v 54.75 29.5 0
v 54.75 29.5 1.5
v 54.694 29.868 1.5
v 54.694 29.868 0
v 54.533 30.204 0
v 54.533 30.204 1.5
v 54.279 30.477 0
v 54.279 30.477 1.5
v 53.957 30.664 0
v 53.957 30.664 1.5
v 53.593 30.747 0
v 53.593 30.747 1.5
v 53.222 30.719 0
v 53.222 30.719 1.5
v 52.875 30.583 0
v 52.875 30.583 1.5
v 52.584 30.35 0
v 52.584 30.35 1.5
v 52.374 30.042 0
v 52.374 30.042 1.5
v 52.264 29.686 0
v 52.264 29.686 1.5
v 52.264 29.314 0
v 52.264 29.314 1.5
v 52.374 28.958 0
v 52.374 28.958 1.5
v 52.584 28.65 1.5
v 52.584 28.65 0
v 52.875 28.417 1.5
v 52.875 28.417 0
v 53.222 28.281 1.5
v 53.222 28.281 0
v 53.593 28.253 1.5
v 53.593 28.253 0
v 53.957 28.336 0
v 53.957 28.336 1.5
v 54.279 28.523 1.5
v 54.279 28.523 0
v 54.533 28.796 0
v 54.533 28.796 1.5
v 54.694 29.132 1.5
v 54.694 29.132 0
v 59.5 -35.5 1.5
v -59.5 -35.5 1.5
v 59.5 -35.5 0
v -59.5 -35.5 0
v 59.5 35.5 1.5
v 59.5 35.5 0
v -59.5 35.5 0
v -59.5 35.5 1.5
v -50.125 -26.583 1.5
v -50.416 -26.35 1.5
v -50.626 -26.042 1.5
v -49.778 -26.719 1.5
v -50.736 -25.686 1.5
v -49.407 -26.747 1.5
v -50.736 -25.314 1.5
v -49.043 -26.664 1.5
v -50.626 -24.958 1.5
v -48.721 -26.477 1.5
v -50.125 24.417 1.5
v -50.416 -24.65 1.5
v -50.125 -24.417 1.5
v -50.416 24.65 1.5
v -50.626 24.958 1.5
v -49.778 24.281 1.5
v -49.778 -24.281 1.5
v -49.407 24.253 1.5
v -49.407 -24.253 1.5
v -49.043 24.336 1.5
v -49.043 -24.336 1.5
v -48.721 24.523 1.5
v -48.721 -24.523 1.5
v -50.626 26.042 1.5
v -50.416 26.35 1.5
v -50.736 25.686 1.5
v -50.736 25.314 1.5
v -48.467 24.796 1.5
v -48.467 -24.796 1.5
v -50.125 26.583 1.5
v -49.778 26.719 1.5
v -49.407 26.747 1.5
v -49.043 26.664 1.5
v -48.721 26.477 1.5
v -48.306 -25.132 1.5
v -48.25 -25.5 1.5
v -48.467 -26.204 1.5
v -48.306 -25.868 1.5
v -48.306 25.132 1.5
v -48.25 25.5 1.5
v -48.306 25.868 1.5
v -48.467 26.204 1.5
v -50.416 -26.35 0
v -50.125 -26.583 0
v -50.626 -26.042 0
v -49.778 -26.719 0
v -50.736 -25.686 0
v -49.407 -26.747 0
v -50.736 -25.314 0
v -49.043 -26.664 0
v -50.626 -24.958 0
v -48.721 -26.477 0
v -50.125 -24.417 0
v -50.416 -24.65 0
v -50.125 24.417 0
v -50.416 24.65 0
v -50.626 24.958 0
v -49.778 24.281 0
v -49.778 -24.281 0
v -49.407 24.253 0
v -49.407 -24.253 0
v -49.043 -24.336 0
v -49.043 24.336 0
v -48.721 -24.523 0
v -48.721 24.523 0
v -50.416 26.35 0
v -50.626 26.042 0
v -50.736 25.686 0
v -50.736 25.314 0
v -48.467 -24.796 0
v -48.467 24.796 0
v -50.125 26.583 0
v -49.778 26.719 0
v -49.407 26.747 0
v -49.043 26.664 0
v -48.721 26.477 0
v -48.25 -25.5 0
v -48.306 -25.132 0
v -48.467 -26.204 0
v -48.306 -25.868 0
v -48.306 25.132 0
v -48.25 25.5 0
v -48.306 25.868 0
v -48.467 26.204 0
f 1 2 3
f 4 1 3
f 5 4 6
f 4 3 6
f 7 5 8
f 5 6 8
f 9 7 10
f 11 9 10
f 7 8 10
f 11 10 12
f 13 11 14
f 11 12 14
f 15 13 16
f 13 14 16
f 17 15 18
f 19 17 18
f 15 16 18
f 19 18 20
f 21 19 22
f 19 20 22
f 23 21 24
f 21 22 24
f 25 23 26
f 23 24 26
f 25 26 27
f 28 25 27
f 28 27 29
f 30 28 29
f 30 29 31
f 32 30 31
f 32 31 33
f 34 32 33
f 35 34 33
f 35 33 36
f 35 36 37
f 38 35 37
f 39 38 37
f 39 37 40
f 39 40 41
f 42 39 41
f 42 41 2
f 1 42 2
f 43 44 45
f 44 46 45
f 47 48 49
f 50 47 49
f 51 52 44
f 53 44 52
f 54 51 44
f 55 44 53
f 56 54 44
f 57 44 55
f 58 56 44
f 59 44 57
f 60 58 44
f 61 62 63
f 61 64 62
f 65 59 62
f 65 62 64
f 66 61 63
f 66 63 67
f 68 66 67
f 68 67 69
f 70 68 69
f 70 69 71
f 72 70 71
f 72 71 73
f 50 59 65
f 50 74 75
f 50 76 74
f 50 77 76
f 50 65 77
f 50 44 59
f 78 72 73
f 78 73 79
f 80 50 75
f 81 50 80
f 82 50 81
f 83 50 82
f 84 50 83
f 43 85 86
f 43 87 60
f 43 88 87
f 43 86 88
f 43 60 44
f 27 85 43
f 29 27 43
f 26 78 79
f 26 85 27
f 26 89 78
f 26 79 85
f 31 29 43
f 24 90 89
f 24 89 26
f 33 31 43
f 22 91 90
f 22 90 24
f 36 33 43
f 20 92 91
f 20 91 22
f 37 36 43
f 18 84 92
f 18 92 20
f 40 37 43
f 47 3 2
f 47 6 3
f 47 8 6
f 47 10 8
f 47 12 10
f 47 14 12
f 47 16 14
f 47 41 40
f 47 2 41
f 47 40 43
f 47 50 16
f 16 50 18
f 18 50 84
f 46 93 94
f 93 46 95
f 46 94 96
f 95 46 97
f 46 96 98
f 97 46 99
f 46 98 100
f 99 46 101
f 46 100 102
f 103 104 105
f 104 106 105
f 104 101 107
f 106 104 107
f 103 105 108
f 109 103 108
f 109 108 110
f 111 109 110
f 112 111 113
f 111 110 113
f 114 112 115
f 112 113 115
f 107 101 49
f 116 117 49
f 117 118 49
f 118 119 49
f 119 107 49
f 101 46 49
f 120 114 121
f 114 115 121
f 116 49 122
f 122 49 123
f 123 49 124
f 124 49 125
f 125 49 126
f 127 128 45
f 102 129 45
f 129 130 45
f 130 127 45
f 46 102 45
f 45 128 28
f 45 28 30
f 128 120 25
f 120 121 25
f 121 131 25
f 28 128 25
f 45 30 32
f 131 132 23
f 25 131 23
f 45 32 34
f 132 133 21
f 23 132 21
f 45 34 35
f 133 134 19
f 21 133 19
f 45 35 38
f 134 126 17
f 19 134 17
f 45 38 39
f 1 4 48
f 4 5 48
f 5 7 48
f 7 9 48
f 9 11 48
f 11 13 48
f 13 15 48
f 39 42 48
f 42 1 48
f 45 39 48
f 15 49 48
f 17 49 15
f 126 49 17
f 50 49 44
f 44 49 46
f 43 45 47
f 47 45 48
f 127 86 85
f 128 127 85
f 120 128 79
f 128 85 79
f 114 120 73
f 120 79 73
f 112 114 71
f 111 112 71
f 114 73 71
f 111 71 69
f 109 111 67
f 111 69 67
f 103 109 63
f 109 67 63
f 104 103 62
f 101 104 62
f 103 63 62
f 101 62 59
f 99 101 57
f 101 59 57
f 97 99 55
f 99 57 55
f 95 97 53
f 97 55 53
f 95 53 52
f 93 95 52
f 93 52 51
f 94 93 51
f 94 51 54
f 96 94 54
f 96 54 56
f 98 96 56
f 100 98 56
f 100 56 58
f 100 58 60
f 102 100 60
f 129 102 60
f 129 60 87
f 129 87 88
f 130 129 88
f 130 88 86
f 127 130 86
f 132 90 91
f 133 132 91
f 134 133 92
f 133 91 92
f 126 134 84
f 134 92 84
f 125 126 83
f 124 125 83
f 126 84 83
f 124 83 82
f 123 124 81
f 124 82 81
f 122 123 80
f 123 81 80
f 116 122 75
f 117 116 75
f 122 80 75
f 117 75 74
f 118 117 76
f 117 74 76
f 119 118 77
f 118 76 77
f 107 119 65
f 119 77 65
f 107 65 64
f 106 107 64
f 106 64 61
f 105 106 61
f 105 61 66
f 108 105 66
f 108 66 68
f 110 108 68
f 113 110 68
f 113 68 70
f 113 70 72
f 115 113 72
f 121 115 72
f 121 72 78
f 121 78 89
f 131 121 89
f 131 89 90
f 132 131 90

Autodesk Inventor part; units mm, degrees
ref_plane "YZ Plane" through (0, 0, 0) normal (1, 0, 0) x (0, 1, 0)
ref_plane "XZ Plane" through (0, 0, 0) normal (0, 1, 0) x (-1, 0, 0)
ref_plane "XY Plane" through (0, 0, 0) normal (0, 0, 1) x (1, 0, 0)
sketch "Schizzo1" plane through (0, 0, 0) normal (0, 0, 1) x (1, 0, 0)
  line L0 (-59.5, -35.5) -> (59.5, -35.5)
  line L1 (59.5, -35.5) -> (59.5, 35.5)
  line L2 (59.5, 35.5) -> (-59.5, 35.5)
  line L3 (-59.5, 35.5) -> (-59.5, -35.5)
  line L4 (-59.5, -35.5) -> (59.5, 35.5) construction
  line L5 (59.5, -35.5) -> (-59.5, 35.5) construction
  point P0 (0, 0)
  dimension "d0" = 119
  dimension "d1" = 71
extrude "Estrusione1" add sketch "Schizzo1" along normal blind 1.5
sketch "Schizzo4" plane through (0, 0, 1.5) normal (0, 0, 1) x (1, 0, 0)
  line L0 (59.5, 35.5) -> (-59.5, 35.5) projected
  line L1 (59.5, -35.5) -> (59.5, 35.5) projected
  line L2 (-59.5, -35.5) -> (59.5, -35.5) projected
  circle A0 centre (-49.5, 25.5) radius 1.25
  circle A1 centre (-49.5, -25.5) radius 1.25
  line L3 (-59.5, 35.5) -> (-59.5, -35.5) projected
  circle A2 centre (53.5, 29.5) radius 1.25
  point P0 (0, 0)
  dimension "d17" = 2.5
  dimension "d18" = 2.5
  dimension "d19" = 10
  dimension "d20" = 10
  dimension "d21" = 10
  dimension "d22" = 10
  dimension "d24" = 2.5
  dimension "d27" = 6
  dimension "d28" = 6
extrude "Estrusione3" cut sketch "Schizzo4" against normal blind 1.5 contours A0 | A1 | A2
properties part number "PCB"
